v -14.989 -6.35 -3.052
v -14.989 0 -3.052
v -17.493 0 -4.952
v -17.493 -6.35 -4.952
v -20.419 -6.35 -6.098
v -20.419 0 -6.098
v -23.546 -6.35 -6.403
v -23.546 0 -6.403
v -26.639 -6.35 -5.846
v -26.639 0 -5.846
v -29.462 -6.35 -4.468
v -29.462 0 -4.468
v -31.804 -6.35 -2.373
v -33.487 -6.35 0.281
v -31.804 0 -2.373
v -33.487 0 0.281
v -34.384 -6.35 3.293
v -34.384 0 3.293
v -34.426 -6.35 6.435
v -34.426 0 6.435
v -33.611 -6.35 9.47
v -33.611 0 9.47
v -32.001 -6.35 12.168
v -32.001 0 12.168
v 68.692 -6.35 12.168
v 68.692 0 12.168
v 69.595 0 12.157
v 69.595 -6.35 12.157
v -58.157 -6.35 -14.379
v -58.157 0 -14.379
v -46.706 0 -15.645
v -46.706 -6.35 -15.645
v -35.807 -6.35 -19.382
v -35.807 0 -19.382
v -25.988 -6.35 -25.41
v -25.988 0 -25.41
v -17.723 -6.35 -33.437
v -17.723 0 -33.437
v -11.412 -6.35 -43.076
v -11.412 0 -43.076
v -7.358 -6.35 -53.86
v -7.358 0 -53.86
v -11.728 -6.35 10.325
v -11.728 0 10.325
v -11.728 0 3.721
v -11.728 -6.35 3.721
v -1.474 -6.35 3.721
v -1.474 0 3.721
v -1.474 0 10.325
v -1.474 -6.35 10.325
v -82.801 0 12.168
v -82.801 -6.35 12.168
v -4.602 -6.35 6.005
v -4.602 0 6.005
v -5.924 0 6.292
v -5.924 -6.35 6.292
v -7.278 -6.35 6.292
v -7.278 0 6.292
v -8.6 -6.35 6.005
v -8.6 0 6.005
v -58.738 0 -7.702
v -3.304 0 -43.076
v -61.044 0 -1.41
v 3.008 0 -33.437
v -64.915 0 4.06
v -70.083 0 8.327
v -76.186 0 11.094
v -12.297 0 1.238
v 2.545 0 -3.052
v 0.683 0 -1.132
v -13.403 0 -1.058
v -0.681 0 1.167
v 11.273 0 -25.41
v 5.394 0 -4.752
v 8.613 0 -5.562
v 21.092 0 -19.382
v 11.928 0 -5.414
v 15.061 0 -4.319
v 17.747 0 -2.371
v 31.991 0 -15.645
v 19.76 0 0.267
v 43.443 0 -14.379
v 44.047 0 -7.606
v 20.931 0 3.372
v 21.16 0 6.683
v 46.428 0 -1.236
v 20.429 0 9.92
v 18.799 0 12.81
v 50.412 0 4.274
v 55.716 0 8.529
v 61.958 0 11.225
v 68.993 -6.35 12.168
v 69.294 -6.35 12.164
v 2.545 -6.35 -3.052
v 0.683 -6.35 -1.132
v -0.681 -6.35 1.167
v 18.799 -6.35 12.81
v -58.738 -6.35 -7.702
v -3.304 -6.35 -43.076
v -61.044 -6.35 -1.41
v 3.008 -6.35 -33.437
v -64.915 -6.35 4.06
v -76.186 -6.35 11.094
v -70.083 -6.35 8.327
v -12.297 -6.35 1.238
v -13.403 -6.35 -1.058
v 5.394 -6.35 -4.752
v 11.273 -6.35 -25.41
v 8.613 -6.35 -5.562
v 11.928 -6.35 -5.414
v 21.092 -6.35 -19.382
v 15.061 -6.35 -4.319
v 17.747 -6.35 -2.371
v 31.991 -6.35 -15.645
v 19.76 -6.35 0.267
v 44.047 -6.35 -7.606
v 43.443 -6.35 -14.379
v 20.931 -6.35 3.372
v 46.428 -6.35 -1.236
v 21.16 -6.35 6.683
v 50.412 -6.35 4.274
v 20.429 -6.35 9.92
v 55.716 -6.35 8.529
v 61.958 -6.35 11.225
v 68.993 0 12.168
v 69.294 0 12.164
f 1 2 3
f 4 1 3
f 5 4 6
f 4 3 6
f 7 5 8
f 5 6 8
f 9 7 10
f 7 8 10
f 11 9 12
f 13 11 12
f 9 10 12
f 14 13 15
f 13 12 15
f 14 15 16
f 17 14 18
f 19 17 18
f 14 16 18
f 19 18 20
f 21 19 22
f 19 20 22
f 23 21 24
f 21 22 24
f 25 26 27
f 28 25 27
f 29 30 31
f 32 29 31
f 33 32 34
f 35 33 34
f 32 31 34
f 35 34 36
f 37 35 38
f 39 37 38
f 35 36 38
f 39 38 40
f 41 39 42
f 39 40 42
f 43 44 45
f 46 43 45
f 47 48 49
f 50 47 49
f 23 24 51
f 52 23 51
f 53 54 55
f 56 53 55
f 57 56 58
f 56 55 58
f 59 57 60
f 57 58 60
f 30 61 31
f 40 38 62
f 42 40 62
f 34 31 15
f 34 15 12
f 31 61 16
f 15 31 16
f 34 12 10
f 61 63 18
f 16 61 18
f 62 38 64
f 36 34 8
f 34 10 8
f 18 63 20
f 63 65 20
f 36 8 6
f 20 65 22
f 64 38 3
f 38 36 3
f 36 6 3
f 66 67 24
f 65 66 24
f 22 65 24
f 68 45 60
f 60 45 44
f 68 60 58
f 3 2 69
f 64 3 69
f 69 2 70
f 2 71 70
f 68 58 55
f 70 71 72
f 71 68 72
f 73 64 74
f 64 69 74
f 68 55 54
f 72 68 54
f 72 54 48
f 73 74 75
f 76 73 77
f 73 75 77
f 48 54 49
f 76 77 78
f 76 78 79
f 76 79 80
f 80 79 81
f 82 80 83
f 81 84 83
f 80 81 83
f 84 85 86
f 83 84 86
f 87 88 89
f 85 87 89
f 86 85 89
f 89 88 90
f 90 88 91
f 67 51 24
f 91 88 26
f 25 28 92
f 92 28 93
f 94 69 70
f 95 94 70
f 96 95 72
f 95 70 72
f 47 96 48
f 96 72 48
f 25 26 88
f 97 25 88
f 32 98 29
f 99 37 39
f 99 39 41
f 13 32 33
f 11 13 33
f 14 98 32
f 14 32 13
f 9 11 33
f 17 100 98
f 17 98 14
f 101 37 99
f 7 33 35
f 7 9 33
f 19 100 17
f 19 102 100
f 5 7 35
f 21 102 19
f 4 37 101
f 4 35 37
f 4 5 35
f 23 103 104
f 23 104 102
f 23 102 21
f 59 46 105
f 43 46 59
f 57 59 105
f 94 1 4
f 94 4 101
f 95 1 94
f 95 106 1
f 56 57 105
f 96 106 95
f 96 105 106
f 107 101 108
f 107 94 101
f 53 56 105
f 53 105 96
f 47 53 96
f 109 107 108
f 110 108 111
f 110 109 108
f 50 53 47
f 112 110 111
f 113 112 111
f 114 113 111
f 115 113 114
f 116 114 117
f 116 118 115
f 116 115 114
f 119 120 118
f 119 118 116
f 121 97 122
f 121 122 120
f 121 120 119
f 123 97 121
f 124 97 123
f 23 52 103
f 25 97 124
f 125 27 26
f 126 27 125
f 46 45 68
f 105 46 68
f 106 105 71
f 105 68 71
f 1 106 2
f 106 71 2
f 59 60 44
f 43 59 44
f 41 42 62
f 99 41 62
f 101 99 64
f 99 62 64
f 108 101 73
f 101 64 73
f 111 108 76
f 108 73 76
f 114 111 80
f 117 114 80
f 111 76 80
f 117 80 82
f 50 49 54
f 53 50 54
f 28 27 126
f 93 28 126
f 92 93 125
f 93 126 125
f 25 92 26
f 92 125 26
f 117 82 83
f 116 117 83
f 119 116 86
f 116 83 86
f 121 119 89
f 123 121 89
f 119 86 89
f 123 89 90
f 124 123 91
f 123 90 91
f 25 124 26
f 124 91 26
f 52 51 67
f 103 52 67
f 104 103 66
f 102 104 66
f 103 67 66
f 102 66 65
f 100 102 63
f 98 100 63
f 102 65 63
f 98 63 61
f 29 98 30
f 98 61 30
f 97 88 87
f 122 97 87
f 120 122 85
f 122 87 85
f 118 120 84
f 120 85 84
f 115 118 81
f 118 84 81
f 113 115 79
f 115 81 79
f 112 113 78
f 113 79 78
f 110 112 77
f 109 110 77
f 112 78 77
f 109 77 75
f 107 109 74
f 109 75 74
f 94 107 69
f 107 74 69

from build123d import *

# Parameters (mm, degrees)
F1_DEPTH = 6.35


with BuildPart() as f1:
    # F0 (on Front) → F1 (new body)
    with BuildSketch(Plane.XZ):
        with BuildLine():
            ThreePointArc((69.594858, 12.156528), (69.143513, 12.166349), (68.692064, 12.168146))
            Line((68.692064, 12.168146), (69.594858, 12.156528))
        make_face()
        with BuildLine():
            Line((-32.000936, 12.168452), (-82.800936, 12.168452))
            ThreePointArc((-82.800936, 12.168452), (-64.915471, 4.059617), (-58.157408, -14.378704))
            ThreePointArc((-58.157408, -14.378704), (-25.988306, -25.409758), (-7.357813, -53.860419))
            ThreePointArc((-7.357813, -53.860419), (11.273169, -25.409729), (43.442592, -14.378704))
            ThreePointArc((43.442592, -14.378704), (50.412065, 4.273605), (68.692064, 12.168146))
            Line((68.692064, 12.168146), (18.799064, 12.810207))
            ThreePointArc((18.799064, 12.810207), (17.746822, -2.370825), (2.544624, -3.052088))
            Line((2.544624, -3.052088), (-14.989253, -3.052088))
            ThreePointArc((-14.989253, -3.052088), (-30.705757, -3.501027), (-32.000936, 12.168452))
        make_face()
        with BuildLine():
            ThreePointArc((-11.728119, 3.721245), (-12.785904, 0.058803), (-14.989253, -3.052088))
            Line((-14.989253, -3.052088), (2.544624, -3.052088))
            ThreePointArc((2.544624, -3.052088), (-0.066364, -0.022448), (-1.473753, 3.721245))
            Line((-1.473753, 3.721245), (-11.728119, 3.721245))
        make_face()
        with BuildLine():
            ThreePointArc((-8.600348, 6.004528), (-10.342651, 5.107293), (-11.728119, 3.721245))
            Line((-11.728119, 3.721245), (-1.473753, 3.721245))
            ThreePointArc((-1.473753, 3.721245), (-2.859221, 5.107293), (-4.601524, 6.004528))
            ThreePointArc((-4.601524, 6.004528), (-6.600936, 6.327729), (-8.600348, 6.004528))
        make_face()
        with BuildLine():
            Line((-11.728119, 10.325245), (-11.728119, 3.721245))
            ThreePointArc((-11.728119, 3.721245), (-10.342651, 5.107293), (-8.600348, 6.004528))
            Line((-8.600348, 6.004528), (-11.728119, 10.325245))
        make_face()
        with BuildLine():
            ThreePointArc((-4.601524, 6.004528), (-2.859221, 5.107293), (-1.473753, 3.721245))
            Line((-1.473753, 3.721245), (-1.473753, 10.325245))
            Line((-1.473753, 10.325245), (-4.601524, 6.004528))
        make_face()
    extrude(amount=F1_DEPTH)


solid = f1.part
